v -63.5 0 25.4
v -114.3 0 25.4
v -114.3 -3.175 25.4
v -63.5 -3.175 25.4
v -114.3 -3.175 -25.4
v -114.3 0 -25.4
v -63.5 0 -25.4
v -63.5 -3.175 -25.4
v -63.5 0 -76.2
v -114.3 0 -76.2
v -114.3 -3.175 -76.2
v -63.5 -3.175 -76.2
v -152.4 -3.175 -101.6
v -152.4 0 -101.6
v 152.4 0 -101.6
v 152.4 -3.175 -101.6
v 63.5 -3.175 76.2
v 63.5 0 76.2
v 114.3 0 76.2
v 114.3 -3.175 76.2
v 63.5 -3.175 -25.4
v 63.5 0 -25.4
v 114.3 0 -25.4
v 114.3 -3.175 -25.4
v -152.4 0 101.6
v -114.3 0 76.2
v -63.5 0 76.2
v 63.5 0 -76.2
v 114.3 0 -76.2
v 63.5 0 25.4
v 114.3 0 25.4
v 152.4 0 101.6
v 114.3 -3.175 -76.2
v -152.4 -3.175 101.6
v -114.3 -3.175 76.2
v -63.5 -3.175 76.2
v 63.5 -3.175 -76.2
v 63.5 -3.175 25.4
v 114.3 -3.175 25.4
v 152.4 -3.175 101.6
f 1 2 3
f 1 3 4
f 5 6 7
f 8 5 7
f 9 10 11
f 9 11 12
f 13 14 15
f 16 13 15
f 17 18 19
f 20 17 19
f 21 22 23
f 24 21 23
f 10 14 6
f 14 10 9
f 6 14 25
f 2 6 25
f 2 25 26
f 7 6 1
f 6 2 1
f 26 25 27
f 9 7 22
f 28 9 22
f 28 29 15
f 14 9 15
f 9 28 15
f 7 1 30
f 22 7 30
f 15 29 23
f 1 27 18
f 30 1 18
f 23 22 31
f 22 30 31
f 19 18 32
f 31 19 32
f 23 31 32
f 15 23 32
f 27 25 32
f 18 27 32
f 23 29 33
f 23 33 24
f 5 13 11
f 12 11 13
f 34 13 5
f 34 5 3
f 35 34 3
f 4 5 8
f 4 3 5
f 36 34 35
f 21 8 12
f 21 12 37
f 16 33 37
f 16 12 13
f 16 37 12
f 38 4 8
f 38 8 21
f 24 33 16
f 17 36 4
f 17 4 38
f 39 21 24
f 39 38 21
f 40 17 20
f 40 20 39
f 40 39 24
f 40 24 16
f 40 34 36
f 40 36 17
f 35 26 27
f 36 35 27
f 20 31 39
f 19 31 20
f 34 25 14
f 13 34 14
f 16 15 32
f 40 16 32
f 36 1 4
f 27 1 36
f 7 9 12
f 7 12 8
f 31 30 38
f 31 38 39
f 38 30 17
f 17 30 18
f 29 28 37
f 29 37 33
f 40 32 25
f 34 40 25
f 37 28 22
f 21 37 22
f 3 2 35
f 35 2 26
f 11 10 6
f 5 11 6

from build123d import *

# Parameters (mm, degrees)
F0_W     = 50.8
F0_H     = 50.8
F1_DEPTH = 3.175


with BuildPart() as f1:
    # F0 (on Front) → F1 (new body)
    with BuildSketch(Plane.XZ):
        Polygon((152.4, 0), (152.4, 101.6), (0, 101.6), (-152.4, 101.6), (-152.4, 0), (-152.4, -101.6), (0, -101.6), (152.4, -101.6), align=None)
        with Locations((-88.9, -50.8)):
            Rectangle(F0_W, F0_H, mode=Mode.SUBTRACT)
        with Locations((88.9, -50.8)):
            Rectangle(F0_W, F0_H, mode=Mode.SUBTRACT)
        with Locations((-88.9, 50.8)):
            Rectangle(F0_W, F0_H, mode=Mode.SUBTRACT)
        with Locations((88.9, 50.8)):
            Rectangle(F0_W, F0_H, mode=Mode.SUBTRACT)
    extrude(amount=F1_DEPTH)


solid = f1.part
